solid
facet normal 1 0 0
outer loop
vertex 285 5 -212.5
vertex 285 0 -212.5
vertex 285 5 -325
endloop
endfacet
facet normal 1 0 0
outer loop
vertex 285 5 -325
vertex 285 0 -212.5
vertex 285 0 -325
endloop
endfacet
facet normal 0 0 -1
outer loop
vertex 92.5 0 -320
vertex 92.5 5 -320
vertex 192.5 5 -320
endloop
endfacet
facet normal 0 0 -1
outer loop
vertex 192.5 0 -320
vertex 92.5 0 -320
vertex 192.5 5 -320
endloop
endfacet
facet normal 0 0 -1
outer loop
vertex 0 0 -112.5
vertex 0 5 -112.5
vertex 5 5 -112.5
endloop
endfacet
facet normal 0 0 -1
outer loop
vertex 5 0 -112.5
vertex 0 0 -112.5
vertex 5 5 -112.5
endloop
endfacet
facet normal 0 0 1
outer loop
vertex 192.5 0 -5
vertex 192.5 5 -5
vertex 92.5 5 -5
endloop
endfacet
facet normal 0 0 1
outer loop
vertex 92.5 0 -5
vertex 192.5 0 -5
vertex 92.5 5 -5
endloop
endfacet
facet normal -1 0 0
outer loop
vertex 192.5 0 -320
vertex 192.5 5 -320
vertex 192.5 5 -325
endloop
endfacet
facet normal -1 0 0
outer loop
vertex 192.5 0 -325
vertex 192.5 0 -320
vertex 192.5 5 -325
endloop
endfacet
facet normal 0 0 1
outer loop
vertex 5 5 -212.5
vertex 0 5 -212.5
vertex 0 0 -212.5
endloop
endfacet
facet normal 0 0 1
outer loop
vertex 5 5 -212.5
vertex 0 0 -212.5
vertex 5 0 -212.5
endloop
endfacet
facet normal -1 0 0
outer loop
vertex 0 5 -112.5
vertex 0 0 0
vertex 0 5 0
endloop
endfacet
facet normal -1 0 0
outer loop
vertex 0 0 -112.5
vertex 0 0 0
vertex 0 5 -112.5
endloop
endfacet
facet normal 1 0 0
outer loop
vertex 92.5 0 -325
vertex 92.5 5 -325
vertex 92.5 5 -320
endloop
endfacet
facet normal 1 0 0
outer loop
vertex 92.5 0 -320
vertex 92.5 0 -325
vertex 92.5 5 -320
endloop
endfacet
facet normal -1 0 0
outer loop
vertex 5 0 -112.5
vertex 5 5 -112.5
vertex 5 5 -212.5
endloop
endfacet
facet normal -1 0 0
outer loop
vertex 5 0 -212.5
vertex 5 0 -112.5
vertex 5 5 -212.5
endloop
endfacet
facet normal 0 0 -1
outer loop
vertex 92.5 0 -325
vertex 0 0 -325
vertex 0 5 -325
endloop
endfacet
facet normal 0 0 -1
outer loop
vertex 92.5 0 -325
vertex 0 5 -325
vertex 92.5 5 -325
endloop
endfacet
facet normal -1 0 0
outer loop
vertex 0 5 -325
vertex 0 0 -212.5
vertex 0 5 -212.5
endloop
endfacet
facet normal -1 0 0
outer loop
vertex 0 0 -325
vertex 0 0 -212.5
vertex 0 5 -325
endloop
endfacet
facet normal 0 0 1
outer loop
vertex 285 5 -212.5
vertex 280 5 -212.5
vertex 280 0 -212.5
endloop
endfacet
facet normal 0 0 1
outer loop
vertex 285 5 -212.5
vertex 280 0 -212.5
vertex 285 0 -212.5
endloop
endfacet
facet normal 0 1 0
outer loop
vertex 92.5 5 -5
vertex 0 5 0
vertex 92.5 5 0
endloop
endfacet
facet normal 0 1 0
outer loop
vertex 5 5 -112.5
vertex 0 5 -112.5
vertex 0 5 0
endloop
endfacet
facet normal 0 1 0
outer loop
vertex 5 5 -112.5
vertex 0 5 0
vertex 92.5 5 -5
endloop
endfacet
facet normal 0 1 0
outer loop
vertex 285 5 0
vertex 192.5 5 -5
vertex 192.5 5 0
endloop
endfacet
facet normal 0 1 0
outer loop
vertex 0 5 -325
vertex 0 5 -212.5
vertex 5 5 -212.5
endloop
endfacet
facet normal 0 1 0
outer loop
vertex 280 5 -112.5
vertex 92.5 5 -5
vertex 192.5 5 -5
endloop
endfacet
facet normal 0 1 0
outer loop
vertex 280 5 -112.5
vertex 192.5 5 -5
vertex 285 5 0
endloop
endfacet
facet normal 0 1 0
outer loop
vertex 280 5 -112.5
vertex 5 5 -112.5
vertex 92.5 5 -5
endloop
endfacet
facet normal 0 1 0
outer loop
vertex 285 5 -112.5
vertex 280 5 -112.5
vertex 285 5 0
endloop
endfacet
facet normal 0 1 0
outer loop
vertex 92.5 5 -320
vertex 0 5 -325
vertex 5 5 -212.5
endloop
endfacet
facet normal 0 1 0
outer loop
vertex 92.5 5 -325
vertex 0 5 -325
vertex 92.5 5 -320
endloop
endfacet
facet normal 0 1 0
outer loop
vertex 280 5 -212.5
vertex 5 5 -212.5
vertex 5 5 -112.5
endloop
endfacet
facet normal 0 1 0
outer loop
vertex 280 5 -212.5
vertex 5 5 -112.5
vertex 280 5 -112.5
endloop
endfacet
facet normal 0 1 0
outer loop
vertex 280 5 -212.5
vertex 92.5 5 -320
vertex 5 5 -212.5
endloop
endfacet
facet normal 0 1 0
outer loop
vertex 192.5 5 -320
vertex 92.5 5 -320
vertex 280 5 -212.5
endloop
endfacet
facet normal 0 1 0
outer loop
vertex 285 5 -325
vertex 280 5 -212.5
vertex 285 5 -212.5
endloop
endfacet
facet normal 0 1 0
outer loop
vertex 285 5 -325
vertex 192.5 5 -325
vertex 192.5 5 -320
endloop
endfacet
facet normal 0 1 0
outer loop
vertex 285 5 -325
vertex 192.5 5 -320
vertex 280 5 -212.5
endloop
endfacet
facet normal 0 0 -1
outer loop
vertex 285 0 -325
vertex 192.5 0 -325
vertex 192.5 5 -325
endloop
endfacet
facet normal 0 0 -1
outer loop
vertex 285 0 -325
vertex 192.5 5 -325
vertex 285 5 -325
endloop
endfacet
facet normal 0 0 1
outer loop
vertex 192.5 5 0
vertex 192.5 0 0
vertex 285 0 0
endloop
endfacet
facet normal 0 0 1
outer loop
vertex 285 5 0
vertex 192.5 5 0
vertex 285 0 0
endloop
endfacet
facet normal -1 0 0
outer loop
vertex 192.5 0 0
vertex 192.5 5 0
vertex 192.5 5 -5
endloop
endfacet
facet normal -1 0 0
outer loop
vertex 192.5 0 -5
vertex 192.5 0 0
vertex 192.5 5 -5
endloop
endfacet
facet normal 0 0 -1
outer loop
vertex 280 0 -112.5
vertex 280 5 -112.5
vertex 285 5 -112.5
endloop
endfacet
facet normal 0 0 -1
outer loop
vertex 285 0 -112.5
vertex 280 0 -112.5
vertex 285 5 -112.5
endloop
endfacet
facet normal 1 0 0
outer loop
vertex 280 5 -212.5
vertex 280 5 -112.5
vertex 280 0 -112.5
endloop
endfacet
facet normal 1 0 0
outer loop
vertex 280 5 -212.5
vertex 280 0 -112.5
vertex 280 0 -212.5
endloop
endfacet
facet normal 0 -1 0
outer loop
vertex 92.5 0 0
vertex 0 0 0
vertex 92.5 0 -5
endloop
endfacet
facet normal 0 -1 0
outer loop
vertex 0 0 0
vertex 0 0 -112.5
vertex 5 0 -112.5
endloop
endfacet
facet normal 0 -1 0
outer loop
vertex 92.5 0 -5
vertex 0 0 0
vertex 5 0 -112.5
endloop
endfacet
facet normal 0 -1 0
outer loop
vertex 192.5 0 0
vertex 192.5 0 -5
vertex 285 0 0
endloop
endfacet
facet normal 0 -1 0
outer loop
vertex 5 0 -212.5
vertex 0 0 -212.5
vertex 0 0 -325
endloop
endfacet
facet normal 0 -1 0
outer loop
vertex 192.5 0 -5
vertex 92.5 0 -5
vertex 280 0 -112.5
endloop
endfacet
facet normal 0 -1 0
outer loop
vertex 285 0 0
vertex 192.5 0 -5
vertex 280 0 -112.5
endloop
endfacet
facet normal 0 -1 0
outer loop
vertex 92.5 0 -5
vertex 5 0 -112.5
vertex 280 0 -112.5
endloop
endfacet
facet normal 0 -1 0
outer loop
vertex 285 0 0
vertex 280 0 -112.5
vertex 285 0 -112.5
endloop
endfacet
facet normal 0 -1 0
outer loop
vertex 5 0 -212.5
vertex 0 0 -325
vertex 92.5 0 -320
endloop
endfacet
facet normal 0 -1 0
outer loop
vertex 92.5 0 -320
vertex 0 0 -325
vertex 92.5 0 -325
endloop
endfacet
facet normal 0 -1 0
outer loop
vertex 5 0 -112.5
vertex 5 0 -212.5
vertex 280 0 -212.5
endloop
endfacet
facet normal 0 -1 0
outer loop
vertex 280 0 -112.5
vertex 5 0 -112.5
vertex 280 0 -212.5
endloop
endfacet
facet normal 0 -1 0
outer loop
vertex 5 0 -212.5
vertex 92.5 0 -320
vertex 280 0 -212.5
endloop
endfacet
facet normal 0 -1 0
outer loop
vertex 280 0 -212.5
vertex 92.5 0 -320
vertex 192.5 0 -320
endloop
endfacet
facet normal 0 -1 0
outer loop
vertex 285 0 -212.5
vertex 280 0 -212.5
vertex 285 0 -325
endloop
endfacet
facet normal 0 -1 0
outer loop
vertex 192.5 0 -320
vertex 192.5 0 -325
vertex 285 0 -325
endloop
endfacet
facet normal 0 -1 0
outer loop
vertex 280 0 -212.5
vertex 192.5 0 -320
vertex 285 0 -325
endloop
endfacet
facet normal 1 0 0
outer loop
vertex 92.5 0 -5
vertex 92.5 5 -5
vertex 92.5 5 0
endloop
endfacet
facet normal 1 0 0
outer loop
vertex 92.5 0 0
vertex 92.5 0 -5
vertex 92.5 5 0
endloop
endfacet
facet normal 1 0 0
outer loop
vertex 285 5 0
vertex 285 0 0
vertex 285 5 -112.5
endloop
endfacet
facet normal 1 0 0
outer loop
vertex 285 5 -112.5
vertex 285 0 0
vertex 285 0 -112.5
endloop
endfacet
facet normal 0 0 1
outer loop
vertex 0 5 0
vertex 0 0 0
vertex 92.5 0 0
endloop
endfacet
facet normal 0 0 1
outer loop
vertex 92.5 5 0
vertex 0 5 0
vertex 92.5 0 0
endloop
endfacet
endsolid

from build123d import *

# Parameters (mm, degrees)
SKIZZE1_W                       = 285
SKIZZE1_H                       = 325
AUFSATZ_LINEAR_AUSTRAGEN1_DEPTH = 5
SKIZZE2_W                       = 5
SKIZZE2_H                       = 100
SCHNITT_LINEAR_AUSTRAGEN1_DEPTH = 433.290411645


with BuildPart() as part:
    # Skizze1 → Aufsatz-Linear austragen1 (new body)
    with BuildSketch(Plane(origin=(0, 0, 0), x_dir=(1, 0, 0), z_dir=(0, 1, 0))):
        with Locations((142.5, 162.5)):
            Rectangle(SKIZZE1_W, SKIZZE1_H)
    extrude(amount=AUFSATZ_LINEAR_AUSTRAGEN1_DEPTH)

    # Skizze2 → Schnitt-Linear austragen1 (cut, through all)
    with BuildSketch(Plane(origin=(0, 5, 0), x_dir=(1, 0, 0), z_dir=(0, 1, 0))):
        Polygon((142.5, 325), (92.5, 325), (92.5, 320), (192.5, 320), (192.5, 325), align=None)
        with Locations((2.5, 162.5)):
            Rectangle(SKIZZE2_W, SKIZZE2_H)
        with Locations((282.5, 162.5)):
            Rectangle(SKIZZE2_W, SKIZZE2_H)
        Polygon((142.5, 0), (192.5, 0), (192.5, 5), (92.5, 5), (92.5, 0), align=None)
    extrude(amount=-SCHNITT_LINEAR_AUSTRAGEN1_DEPTH, mode=Mode.SUBTRACT)


solid = part.part
